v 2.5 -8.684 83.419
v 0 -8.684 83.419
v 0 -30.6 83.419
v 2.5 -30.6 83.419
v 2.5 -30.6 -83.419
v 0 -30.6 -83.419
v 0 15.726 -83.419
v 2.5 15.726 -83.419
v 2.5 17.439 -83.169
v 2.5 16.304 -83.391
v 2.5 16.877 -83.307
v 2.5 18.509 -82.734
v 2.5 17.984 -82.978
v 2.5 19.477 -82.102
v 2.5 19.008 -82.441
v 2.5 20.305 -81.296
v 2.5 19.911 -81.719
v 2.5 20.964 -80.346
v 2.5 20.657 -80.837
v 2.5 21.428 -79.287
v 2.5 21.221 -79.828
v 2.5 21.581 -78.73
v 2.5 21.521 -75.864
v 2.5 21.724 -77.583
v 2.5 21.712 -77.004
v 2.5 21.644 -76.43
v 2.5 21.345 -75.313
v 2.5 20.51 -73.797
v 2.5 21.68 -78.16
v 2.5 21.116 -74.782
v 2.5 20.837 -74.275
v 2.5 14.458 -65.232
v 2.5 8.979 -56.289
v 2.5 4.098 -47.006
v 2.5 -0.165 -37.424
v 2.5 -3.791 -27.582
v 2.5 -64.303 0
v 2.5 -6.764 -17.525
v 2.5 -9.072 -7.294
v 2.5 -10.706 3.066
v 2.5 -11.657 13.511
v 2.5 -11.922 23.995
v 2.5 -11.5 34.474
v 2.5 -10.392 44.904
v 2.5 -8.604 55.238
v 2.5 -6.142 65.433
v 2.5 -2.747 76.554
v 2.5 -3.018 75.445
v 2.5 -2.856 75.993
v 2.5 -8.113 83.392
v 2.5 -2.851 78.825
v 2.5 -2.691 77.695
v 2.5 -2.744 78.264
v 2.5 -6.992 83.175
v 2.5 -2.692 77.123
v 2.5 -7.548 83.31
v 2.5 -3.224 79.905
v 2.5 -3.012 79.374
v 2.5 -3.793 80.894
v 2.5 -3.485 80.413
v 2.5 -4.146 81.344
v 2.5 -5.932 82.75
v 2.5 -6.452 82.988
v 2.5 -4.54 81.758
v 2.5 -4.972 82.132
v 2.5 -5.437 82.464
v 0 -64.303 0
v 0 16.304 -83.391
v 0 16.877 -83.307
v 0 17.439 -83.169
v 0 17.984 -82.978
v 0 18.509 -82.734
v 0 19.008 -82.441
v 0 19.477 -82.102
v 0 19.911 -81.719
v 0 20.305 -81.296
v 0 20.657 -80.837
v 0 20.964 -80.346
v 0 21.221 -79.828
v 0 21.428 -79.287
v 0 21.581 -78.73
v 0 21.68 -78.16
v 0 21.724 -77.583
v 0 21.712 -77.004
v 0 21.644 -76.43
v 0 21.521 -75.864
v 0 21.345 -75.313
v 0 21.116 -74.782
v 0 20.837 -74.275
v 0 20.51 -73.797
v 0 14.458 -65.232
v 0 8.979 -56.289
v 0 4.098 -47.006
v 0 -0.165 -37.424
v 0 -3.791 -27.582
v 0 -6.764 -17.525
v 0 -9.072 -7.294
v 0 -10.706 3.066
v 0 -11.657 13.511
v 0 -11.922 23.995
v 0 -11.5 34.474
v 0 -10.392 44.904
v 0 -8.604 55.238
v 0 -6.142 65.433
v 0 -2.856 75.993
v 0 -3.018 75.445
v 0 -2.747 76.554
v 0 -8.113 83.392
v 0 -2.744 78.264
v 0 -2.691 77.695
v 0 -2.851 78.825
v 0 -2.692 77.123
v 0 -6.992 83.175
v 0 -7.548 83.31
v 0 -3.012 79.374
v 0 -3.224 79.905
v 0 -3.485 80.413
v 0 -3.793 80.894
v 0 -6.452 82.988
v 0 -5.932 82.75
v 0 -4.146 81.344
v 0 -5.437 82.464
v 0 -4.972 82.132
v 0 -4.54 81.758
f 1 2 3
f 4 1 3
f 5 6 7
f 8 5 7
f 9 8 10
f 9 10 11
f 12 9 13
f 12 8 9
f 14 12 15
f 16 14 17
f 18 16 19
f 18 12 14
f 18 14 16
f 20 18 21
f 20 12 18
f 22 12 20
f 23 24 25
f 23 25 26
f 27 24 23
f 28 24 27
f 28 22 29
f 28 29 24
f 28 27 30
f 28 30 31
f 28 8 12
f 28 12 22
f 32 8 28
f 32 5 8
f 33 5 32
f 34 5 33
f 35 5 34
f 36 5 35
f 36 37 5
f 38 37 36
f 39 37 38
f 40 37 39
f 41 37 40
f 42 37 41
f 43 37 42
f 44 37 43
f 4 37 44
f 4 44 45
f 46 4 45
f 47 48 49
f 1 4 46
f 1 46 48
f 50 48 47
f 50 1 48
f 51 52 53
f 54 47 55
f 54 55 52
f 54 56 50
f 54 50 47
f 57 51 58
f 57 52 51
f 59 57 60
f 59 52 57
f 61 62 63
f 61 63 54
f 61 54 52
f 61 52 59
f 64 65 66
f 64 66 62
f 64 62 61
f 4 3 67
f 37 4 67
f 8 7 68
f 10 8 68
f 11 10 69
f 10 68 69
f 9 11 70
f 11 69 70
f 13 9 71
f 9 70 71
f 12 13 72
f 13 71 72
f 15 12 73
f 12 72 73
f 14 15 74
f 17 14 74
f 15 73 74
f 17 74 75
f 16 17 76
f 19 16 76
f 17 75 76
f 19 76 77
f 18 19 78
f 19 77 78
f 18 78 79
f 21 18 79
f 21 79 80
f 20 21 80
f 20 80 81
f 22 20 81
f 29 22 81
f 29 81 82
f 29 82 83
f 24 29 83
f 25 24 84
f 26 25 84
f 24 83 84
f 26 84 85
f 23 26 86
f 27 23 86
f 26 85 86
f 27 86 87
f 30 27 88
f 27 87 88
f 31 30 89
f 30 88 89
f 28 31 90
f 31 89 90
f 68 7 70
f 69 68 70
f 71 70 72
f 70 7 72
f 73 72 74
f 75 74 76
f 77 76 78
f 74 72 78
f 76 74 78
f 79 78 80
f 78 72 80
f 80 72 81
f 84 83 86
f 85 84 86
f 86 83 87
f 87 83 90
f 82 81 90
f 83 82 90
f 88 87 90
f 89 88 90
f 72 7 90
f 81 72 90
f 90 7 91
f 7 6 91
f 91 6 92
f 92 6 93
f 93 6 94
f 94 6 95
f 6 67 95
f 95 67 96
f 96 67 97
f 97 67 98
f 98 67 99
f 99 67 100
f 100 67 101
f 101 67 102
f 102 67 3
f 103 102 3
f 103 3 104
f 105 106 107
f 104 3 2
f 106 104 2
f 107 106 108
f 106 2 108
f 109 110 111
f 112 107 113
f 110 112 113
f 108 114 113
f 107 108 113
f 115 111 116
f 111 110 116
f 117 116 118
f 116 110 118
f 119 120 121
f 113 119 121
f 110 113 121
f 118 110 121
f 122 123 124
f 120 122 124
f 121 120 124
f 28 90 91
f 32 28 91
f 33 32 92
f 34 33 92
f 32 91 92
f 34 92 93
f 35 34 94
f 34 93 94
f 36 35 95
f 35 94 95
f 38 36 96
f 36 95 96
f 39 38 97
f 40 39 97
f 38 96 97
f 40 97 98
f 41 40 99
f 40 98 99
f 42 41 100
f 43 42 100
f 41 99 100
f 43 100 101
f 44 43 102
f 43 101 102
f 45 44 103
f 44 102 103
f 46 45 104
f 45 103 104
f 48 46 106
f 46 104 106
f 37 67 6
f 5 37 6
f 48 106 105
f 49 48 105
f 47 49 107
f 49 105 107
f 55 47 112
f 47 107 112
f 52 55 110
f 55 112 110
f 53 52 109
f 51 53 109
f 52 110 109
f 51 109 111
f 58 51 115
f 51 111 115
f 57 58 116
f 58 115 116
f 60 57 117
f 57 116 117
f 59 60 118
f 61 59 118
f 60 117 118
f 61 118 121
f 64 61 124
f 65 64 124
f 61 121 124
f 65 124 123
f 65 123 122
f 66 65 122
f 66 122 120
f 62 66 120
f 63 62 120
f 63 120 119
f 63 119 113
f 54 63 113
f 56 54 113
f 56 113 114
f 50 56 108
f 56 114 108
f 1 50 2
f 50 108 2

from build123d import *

# Parameters (mm, degrees)
F1_DEPTH = 2.5


with BuildPart() as f1:
    # F0 (on Right) → F1 (new body)
    with BuildSketch(Plane.YZ):
        with BuildLine():
            ThreePointArc((-3.018316, 75.444877), (-3.793379, 80.894136), (-8.684346, 83.418731))
            Line((-8.684346, 83.418731), (-30.6, 83.418731))
            Line((-30.6, 83.418731), (-64.303355, 0))
            Line((-64.303355, 0), (-30.6, -83.418731))
            Line((-30.6, -83.418731), (15.726308, -83.418731))
            ThreePointArc((15.726308, -83.418731), (21.098828, -80.090065), (20.510239, -73.797405))
            ThreePointArc((20.510239, -73.797405), (-9.973866, -2.127509), (-3.018316, 75.444877))
        make_face()
    extrude(amount=F1_DEPTH)


solid = f1.part
